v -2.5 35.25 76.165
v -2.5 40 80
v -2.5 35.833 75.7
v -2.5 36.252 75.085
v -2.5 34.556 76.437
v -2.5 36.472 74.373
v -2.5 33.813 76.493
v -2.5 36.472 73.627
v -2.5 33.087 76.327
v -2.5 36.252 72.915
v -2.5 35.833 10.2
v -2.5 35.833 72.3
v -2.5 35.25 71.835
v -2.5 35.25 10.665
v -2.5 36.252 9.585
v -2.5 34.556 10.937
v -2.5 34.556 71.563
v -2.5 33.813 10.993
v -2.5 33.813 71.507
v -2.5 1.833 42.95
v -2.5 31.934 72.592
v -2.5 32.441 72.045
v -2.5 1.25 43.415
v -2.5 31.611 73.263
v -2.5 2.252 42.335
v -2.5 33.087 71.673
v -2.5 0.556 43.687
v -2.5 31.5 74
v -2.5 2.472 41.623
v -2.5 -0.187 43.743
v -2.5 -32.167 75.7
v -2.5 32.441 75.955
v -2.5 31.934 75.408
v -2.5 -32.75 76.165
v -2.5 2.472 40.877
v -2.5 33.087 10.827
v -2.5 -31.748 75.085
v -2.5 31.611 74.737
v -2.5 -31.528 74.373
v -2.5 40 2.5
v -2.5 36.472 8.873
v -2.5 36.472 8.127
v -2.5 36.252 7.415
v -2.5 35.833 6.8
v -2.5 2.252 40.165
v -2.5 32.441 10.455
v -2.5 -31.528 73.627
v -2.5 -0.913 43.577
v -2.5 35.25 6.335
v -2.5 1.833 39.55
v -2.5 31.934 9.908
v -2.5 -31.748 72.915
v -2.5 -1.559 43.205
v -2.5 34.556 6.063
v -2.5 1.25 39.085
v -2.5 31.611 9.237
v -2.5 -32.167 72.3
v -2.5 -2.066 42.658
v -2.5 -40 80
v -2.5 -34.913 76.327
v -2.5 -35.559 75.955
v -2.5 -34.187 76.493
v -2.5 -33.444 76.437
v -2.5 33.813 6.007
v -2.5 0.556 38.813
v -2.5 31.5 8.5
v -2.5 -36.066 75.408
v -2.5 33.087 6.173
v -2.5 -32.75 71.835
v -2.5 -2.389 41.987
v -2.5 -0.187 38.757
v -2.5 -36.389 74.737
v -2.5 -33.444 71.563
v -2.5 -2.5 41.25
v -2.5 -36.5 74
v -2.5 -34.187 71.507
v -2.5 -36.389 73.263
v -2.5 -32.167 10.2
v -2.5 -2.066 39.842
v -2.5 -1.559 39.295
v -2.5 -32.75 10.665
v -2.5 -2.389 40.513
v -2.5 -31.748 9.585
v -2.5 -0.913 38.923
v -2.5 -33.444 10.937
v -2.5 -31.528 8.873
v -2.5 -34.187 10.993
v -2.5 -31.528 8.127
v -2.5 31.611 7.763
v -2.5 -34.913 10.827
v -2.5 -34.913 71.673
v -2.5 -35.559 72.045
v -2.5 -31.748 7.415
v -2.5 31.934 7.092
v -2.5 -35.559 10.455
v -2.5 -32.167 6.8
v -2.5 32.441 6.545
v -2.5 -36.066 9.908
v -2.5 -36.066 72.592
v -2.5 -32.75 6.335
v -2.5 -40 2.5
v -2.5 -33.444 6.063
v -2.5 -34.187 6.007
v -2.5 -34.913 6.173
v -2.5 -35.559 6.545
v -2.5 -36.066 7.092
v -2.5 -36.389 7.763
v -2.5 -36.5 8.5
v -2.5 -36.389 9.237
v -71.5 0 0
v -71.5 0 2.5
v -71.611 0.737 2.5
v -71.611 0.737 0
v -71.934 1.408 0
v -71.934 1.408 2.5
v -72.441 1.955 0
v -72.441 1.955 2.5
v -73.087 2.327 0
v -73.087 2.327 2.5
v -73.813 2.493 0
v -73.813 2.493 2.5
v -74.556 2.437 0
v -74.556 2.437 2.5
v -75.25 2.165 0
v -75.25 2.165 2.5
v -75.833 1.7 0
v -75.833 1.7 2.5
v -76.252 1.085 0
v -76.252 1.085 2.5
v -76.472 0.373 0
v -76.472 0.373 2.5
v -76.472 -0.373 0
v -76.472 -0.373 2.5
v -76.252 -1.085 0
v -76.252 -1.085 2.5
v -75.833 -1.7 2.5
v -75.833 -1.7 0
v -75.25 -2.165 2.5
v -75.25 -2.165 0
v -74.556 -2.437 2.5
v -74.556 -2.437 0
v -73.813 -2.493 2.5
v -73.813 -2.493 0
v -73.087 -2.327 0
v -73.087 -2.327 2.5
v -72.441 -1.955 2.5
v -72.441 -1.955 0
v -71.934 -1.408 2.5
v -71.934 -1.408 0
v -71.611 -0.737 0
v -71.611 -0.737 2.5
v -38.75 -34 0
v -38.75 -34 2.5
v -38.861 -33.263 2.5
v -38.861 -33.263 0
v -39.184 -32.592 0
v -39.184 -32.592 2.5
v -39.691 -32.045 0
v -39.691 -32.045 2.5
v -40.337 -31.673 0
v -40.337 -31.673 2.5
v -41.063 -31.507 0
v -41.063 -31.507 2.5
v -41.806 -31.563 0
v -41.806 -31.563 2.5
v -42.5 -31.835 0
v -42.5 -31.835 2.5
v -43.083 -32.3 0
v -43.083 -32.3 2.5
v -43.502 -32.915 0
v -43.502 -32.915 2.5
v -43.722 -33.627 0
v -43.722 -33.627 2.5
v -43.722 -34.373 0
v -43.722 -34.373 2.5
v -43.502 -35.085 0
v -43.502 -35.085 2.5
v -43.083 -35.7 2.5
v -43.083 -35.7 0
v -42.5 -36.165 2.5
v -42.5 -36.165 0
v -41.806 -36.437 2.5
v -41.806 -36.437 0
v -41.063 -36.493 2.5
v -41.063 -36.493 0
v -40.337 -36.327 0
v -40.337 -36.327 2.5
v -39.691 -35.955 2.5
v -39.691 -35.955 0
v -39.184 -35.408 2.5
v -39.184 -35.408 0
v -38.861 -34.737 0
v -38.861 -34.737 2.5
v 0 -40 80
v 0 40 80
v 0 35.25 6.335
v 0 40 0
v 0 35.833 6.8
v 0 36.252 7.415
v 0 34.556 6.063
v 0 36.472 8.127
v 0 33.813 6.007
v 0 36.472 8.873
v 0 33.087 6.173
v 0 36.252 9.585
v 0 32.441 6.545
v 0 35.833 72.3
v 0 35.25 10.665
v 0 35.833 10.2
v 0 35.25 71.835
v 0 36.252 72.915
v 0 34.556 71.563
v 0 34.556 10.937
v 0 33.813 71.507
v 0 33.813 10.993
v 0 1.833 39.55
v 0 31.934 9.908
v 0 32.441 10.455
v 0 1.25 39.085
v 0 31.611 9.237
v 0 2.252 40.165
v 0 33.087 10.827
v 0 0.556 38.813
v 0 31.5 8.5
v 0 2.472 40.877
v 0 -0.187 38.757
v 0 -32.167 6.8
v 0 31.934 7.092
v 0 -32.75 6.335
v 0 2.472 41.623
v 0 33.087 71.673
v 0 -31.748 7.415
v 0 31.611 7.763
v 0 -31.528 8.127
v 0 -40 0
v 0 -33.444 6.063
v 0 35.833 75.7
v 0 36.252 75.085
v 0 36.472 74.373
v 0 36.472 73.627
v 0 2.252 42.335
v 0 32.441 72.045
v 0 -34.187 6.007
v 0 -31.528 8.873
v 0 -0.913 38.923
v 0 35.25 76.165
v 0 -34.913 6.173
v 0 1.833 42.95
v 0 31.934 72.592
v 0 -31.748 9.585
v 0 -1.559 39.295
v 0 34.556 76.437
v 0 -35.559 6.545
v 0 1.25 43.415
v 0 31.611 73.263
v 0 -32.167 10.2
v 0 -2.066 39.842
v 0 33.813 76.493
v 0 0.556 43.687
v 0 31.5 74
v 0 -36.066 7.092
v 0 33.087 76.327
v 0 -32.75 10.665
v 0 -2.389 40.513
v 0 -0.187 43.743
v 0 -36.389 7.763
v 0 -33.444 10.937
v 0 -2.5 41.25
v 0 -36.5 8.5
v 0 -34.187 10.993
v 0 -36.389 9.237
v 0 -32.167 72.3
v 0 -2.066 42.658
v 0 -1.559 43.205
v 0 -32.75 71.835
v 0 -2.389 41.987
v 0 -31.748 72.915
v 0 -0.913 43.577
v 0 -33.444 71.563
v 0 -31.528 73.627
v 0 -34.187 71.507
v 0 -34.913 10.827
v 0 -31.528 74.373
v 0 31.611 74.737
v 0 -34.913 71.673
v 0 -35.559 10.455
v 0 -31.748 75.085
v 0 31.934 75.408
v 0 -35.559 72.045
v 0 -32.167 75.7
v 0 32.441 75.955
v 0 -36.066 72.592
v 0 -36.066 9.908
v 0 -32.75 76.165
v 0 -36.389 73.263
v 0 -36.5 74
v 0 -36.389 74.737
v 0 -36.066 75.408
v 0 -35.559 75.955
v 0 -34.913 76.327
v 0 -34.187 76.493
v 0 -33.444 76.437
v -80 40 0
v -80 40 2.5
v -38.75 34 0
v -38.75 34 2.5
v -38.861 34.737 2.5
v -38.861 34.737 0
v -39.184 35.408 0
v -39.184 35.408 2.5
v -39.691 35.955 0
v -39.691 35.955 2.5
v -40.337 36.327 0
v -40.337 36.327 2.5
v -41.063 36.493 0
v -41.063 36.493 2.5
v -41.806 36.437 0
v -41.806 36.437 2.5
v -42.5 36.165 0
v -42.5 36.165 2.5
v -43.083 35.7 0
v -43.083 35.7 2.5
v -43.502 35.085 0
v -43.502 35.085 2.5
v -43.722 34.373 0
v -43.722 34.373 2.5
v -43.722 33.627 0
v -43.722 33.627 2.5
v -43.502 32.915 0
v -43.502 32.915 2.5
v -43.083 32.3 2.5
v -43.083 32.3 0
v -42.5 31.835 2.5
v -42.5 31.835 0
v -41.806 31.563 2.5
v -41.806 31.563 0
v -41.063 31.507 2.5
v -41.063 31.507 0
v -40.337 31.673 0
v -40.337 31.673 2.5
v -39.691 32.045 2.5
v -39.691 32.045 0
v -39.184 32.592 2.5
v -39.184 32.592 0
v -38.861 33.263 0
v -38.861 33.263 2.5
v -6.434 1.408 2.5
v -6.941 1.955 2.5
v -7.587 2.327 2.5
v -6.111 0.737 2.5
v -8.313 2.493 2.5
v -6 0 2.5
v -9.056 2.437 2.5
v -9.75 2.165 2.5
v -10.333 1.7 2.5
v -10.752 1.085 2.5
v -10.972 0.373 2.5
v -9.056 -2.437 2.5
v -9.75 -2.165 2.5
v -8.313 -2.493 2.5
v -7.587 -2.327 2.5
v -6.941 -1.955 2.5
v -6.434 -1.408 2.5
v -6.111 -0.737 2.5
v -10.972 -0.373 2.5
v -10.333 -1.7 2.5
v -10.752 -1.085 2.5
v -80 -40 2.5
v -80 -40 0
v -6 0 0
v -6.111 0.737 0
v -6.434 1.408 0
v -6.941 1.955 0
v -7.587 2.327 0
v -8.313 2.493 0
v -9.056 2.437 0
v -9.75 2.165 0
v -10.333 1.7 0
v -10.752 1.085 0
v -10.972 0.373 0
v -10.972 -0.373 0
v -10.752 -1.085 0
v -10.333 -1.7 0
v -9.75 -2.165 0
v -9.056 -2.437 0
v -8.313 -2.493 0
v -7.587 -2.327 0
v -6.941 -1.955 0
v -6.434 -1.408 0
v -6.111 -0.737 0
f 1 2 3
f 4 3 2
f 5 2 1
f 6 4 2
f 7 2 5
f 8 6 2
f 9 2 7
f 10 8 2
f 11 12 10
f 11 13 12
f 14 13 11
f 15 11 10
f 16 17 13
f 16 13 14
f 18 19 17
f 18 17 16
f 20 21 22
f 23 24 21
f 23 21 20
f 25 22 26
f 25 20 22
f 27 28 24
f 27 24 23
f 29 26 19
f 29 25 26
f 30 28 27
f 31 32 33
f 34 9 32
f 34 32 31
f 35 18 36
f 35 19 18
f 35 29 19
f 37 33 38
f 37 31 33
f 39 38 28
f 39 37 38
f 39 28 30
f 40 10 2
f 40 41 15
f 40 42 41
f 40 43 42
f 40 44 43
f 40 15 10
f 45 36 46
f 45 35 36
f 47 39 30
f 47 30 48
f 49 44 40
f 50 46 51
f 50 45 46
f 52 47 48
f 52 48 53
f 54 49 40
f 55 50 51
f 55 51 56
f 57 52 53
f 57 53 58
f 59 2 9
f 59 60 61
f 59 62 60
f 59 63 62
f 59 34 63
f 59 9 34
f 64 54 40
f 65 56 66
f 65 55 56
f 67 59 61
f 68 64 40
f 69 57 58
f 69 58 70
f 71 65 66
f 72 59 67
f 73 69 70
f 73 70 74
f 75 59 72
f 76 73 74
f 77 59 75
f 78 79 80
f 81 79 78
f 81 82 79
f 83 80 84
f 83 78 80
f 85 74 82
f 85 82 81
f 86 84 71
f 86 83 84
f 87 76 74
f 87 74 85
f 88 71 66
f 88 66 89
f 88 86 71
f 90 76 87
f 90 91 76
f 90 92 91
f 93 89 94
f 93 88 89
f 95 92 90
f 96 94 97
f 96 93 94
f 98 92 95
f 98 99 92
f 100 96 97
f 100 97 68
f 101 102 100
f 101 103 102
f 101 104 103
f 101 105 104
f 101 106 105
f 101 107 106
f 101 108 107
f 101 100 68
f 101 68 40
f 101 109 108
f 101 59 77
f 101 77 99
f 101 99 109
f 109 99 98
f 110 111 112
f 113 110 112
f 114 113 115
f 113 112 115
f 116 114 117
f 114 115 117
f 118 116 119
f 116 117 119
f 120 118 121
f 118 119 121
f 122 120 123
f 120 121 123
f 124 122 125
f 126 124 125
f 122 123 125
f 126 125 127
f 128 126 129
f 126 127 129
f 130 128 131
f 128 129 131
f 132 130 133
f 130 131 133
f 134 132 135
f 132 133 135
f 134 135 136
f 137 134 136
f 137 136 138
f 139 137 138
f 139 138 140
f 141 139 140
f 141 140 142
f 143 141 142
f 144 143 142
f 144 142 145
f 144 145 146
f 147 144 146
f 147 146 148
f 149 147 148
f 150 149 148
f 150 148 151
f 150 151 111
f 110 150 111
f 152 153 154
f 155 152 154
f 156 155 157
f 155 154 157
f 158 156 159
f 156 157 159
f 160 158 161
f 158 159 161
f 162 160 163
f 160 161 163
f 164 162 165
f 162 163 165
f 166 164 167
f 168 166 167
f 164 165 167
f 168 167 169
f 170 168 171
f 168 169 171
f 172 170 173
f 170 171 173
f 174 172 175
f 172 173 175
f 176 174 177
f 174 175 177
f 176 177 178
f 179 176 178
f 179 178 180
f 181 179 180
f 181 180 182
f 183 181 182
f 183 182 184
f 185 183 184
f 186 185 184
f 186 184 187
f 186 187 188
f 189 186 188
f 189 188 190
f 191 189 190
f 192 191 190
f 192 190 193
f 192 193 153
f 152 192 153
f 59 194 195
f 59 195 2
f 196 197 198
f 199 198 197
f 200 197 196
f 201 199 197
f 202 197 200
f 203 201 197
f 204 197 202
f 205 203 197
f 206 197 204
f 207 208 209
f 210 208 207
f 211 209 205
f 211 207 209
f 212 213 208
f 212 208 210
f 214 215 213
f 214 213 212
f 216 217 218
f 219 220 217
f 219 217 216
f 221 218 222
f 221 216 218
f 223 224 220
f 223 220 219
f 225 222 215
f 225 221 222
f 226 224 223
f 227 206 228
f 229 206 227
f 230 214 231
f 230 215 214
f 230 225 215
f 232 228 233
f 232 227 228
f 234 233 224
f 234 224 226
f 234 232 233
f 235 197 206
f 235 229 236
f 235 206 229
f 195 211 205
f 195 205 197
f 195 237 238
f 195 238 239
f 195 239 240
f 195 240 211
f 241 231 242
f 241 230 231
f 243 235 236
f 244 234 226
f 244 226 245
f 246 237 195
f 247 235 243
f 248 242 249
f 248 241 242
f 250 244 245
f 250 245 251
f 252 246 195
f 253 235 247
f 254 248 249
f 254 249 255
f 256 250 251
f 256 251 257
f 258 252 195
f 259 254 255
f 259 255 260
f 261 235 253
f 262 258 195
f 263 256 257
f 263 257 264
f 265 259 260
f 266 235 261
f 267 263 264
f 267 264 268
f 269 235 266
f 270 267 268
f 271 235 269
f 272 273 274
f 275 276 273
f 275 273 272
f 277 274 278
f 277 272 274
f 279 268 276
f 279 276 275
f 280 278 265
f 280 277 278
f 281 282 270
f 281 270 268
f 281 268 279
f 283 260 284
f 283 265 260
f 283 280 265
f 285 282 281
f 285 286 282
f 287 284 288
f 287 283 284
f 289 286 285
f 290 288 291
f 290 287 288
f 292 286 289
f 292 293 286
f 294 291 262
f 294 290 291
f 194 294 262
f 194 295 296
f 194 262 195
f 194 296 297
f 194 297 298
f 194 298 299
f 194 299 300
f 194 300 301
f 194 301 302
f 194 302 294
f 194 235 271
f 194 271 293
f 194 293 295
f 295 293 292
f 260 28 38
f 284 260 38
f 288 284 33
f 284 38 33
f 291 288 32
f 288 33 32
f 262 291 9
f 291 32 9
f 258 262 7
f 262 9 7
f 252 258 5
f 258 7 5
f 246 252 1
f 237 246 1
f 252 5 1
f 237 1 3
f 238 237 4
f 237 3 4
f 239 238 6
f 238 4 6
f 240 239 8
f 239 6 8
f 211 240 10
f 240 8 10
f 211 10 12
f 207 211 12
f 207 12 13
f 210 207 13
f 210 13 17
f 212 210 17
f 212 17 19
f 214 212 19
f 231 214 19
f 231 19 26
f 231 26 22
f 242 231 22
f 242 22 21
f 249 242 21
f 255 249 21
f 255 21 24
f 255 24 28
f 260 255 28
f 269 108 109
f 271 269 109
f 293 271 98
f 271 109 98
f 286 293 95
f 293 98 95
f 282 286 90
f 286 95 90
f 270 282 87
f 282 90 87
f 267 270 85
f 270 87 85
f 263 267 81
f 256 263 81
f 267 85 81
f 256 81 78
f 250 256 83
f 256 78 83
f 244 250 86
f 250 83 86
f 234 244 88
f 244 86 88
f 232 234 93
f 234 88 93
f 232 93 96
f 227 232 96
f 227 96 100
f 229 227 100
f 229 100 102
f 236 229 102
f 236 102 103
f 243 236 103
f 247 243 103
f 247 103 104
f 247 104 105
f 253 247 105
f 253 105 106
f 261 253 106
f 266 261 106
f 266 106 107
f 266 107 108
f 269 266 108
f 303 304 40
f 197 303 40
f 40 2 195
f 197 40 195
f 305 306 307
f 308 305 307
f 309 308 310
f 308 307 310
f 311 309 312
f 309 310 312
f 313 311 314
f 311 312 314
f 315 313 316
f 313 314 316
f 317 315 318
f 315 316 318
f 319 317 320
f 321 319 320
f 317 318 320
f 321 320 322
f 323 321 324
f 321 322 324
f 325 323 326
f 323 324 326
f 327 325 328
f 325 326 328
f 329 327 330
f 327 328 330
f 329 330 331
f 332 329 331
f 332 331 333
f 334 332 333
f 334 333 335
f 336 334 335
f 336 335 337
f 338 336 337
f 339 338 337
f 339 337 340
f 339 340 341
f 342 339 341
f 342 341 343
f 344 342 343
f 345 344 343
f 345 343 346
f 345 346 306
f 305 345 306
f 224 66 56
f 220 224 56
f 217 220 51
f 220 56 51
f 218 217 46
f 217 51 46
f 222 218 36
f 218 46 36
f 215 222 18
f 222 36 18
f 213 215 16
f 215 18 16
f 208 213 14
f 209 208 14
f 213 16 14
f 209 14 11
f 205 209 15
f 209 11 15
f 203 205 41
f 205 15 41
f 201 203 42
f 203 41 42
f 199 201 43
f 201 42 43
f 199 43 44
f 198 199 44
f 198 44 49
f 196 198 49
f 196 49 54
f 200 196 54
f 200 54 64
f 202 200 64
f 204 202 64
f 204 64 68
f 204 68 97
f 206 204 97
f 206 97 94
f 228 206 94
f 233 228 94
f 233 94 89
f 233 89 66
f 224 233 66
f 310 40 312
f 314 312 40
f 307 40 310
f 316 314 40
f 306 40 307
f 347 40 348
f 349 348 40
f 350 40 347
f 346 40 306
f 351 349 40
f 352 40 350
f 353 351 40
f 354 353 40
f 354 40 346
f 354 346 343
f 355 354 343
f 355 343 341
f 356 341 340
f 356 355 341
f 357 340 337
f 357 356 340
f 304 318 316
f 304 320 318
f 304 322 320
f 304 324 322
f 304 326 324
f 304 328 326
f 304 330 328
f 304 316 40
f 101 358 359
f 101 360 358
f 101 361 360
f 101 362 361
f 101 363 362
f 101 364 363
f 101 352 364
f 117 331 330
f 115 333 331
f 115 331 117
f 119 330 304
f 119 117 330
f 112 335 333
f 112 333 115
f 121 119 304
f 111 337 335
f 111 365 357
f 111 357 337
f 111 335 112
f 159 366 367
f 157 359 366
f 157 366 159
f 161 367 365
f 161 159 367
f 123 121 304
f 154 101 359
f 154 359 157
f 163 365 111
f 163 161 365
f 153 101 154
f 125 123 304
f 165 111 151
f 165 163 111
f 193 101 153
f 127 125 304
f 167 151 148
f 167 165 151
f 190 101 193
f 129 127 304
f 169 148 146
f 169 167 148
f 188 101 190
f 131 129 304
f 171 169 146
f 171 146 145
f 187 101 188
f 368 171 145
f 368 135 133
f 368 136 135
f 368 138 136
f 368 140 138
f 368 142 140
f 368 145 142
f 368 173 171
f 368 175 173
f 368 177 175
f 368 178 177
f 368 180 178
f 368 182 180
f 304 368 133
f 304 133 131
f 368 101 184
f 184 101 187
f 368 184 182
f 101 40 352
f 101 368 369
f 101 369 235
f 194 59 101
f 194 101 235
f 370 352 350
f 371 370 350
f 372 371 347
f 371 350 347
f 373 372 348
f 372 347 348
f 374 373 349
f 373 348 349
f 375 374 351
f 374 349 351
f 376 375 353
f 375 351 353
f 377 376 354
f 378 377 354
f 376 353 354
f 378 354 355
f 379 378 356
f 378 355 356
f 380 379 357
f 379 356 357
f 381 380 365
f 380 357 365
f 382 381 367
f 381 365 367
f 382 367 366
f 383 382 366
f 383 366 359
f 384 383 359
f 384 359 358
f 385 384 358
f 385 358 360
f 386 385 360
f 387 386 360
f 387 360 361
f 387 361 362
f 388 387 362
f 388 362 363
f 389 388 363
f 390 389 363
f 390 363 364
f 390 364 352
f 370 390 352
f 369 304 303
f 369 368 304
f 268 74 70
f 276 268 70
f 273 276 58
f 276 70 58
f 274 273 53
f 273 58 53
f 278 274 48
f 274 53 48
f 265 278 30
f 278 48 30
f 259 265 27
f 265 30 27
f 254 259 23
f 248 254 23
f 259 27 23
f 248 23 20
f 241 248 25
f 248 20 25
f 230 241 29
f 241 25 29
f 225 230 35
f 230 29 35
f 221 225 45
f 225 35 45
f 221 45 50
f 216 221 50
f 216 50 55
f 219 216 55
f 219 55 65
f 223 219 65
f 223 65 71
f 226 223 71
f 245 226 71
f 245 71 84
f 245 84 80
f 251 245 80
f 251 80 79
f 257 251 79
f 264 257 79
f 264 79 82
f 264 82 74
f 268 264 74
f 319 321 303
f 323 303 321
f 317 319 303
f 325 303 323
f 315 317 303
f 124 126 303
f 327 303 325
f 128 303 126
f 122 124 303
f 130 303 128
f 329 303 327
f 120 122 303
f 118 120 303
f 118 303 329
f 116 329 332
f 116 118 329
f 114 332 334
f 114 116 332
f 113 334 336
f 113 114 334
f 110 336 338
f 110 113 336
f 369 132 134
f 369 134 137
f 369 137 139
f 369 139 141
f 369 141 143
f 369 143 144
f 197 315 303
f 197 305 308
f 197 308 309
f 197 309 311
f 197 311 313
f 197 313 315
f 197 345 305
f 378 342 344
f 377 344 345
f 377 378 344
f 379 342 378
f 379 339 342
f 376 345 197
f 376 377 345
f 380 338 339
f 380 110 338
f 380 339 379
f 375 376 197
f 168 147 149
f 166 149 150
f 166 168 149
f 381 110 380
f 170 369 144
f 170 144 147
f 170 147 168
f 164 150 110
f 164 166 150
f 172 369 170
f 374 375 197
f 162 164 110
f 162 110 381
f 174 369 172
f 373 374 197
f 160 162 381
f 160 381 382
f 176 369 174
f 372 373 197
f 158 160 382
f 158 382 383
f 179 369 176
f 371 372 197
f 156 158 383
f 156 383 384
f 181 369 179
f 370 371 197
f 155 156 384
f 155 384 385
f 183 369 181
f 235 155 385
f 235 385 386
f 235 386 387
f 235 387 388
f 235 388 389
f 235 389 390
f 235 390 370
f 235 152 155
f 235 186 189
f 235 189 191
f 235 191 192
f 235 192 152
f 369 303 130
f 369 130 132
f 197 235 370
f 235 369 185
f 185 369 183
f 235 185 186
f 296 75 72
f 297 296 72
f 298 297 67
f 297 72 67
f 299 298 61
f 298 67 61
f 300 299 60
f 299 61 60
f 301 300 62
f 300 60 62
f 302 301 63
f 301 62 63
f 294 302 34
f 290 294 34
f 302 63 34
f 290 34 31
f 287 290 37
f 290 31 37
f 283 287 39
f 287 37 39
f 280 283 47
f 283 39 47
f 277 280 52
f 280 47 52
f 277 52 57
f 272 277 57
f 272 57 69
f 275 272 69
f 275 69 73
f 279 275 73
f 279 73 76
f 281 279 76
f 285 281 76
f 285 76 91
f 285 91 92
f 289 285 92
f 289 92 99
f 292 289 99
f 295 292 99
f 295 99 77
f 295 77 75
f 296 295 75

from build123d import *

# Parameters (mm, degrees)
F1_DEPTH = 40
F2_R     = 2.5
F3_DEPTH = 25
F4_R     = 2.5
F5_DEPTH = 25


with BuildPart() as f1:
    # F0 (on Front) → F1 (new body, symmetric)
    with BuildSketch(Plane.XZ):
        Polygon((-80, 2.5), (-80, 0), (0, 0), (0, 80), (-2.5, 80), (-2.5, 2.5), align=None)
    extrude(amount=F1_DEPTH, both=True)

    # F2 (on face) → F3 (cut)
    with BuildSketch(Plane(origin=(-2.5, 0, 0), x_dir=(0, -1, 0), z_dir=(-1, 0, 0))):
        with Locations((0, 41.25)):
            Circle(F2_R)
        with Locations((-34, 8.5)):
            Circle(F2_R)
        with Locations((-34, 74)):
            Circle(F2_R)
        with Locations((34, 74)):
            Circle(F2_R)
        with Locations((34, 8.5)):
            Circle(F2_R)
    extrude(amount=-F3_DEPTH, mode=Mode.SUBTRACT)

    # F4 (on face) → F5 (cut)
    with BuildSketch(Plane.XY.offset(2.5)):
        with Locations((-74, 0)):
            Circle(F4_R)
        with Locations((-41.25, 34)):
            Circle(F4_R)
        with Locations((-41.25, -34)):
            Circle(F4_R)
        with Locations((-8.5, 0)):
            Circle(F4_R)
    extrude(amount=-F5_DEPTH, mode=Mode.SUBTRACT)


solid = f1.part
